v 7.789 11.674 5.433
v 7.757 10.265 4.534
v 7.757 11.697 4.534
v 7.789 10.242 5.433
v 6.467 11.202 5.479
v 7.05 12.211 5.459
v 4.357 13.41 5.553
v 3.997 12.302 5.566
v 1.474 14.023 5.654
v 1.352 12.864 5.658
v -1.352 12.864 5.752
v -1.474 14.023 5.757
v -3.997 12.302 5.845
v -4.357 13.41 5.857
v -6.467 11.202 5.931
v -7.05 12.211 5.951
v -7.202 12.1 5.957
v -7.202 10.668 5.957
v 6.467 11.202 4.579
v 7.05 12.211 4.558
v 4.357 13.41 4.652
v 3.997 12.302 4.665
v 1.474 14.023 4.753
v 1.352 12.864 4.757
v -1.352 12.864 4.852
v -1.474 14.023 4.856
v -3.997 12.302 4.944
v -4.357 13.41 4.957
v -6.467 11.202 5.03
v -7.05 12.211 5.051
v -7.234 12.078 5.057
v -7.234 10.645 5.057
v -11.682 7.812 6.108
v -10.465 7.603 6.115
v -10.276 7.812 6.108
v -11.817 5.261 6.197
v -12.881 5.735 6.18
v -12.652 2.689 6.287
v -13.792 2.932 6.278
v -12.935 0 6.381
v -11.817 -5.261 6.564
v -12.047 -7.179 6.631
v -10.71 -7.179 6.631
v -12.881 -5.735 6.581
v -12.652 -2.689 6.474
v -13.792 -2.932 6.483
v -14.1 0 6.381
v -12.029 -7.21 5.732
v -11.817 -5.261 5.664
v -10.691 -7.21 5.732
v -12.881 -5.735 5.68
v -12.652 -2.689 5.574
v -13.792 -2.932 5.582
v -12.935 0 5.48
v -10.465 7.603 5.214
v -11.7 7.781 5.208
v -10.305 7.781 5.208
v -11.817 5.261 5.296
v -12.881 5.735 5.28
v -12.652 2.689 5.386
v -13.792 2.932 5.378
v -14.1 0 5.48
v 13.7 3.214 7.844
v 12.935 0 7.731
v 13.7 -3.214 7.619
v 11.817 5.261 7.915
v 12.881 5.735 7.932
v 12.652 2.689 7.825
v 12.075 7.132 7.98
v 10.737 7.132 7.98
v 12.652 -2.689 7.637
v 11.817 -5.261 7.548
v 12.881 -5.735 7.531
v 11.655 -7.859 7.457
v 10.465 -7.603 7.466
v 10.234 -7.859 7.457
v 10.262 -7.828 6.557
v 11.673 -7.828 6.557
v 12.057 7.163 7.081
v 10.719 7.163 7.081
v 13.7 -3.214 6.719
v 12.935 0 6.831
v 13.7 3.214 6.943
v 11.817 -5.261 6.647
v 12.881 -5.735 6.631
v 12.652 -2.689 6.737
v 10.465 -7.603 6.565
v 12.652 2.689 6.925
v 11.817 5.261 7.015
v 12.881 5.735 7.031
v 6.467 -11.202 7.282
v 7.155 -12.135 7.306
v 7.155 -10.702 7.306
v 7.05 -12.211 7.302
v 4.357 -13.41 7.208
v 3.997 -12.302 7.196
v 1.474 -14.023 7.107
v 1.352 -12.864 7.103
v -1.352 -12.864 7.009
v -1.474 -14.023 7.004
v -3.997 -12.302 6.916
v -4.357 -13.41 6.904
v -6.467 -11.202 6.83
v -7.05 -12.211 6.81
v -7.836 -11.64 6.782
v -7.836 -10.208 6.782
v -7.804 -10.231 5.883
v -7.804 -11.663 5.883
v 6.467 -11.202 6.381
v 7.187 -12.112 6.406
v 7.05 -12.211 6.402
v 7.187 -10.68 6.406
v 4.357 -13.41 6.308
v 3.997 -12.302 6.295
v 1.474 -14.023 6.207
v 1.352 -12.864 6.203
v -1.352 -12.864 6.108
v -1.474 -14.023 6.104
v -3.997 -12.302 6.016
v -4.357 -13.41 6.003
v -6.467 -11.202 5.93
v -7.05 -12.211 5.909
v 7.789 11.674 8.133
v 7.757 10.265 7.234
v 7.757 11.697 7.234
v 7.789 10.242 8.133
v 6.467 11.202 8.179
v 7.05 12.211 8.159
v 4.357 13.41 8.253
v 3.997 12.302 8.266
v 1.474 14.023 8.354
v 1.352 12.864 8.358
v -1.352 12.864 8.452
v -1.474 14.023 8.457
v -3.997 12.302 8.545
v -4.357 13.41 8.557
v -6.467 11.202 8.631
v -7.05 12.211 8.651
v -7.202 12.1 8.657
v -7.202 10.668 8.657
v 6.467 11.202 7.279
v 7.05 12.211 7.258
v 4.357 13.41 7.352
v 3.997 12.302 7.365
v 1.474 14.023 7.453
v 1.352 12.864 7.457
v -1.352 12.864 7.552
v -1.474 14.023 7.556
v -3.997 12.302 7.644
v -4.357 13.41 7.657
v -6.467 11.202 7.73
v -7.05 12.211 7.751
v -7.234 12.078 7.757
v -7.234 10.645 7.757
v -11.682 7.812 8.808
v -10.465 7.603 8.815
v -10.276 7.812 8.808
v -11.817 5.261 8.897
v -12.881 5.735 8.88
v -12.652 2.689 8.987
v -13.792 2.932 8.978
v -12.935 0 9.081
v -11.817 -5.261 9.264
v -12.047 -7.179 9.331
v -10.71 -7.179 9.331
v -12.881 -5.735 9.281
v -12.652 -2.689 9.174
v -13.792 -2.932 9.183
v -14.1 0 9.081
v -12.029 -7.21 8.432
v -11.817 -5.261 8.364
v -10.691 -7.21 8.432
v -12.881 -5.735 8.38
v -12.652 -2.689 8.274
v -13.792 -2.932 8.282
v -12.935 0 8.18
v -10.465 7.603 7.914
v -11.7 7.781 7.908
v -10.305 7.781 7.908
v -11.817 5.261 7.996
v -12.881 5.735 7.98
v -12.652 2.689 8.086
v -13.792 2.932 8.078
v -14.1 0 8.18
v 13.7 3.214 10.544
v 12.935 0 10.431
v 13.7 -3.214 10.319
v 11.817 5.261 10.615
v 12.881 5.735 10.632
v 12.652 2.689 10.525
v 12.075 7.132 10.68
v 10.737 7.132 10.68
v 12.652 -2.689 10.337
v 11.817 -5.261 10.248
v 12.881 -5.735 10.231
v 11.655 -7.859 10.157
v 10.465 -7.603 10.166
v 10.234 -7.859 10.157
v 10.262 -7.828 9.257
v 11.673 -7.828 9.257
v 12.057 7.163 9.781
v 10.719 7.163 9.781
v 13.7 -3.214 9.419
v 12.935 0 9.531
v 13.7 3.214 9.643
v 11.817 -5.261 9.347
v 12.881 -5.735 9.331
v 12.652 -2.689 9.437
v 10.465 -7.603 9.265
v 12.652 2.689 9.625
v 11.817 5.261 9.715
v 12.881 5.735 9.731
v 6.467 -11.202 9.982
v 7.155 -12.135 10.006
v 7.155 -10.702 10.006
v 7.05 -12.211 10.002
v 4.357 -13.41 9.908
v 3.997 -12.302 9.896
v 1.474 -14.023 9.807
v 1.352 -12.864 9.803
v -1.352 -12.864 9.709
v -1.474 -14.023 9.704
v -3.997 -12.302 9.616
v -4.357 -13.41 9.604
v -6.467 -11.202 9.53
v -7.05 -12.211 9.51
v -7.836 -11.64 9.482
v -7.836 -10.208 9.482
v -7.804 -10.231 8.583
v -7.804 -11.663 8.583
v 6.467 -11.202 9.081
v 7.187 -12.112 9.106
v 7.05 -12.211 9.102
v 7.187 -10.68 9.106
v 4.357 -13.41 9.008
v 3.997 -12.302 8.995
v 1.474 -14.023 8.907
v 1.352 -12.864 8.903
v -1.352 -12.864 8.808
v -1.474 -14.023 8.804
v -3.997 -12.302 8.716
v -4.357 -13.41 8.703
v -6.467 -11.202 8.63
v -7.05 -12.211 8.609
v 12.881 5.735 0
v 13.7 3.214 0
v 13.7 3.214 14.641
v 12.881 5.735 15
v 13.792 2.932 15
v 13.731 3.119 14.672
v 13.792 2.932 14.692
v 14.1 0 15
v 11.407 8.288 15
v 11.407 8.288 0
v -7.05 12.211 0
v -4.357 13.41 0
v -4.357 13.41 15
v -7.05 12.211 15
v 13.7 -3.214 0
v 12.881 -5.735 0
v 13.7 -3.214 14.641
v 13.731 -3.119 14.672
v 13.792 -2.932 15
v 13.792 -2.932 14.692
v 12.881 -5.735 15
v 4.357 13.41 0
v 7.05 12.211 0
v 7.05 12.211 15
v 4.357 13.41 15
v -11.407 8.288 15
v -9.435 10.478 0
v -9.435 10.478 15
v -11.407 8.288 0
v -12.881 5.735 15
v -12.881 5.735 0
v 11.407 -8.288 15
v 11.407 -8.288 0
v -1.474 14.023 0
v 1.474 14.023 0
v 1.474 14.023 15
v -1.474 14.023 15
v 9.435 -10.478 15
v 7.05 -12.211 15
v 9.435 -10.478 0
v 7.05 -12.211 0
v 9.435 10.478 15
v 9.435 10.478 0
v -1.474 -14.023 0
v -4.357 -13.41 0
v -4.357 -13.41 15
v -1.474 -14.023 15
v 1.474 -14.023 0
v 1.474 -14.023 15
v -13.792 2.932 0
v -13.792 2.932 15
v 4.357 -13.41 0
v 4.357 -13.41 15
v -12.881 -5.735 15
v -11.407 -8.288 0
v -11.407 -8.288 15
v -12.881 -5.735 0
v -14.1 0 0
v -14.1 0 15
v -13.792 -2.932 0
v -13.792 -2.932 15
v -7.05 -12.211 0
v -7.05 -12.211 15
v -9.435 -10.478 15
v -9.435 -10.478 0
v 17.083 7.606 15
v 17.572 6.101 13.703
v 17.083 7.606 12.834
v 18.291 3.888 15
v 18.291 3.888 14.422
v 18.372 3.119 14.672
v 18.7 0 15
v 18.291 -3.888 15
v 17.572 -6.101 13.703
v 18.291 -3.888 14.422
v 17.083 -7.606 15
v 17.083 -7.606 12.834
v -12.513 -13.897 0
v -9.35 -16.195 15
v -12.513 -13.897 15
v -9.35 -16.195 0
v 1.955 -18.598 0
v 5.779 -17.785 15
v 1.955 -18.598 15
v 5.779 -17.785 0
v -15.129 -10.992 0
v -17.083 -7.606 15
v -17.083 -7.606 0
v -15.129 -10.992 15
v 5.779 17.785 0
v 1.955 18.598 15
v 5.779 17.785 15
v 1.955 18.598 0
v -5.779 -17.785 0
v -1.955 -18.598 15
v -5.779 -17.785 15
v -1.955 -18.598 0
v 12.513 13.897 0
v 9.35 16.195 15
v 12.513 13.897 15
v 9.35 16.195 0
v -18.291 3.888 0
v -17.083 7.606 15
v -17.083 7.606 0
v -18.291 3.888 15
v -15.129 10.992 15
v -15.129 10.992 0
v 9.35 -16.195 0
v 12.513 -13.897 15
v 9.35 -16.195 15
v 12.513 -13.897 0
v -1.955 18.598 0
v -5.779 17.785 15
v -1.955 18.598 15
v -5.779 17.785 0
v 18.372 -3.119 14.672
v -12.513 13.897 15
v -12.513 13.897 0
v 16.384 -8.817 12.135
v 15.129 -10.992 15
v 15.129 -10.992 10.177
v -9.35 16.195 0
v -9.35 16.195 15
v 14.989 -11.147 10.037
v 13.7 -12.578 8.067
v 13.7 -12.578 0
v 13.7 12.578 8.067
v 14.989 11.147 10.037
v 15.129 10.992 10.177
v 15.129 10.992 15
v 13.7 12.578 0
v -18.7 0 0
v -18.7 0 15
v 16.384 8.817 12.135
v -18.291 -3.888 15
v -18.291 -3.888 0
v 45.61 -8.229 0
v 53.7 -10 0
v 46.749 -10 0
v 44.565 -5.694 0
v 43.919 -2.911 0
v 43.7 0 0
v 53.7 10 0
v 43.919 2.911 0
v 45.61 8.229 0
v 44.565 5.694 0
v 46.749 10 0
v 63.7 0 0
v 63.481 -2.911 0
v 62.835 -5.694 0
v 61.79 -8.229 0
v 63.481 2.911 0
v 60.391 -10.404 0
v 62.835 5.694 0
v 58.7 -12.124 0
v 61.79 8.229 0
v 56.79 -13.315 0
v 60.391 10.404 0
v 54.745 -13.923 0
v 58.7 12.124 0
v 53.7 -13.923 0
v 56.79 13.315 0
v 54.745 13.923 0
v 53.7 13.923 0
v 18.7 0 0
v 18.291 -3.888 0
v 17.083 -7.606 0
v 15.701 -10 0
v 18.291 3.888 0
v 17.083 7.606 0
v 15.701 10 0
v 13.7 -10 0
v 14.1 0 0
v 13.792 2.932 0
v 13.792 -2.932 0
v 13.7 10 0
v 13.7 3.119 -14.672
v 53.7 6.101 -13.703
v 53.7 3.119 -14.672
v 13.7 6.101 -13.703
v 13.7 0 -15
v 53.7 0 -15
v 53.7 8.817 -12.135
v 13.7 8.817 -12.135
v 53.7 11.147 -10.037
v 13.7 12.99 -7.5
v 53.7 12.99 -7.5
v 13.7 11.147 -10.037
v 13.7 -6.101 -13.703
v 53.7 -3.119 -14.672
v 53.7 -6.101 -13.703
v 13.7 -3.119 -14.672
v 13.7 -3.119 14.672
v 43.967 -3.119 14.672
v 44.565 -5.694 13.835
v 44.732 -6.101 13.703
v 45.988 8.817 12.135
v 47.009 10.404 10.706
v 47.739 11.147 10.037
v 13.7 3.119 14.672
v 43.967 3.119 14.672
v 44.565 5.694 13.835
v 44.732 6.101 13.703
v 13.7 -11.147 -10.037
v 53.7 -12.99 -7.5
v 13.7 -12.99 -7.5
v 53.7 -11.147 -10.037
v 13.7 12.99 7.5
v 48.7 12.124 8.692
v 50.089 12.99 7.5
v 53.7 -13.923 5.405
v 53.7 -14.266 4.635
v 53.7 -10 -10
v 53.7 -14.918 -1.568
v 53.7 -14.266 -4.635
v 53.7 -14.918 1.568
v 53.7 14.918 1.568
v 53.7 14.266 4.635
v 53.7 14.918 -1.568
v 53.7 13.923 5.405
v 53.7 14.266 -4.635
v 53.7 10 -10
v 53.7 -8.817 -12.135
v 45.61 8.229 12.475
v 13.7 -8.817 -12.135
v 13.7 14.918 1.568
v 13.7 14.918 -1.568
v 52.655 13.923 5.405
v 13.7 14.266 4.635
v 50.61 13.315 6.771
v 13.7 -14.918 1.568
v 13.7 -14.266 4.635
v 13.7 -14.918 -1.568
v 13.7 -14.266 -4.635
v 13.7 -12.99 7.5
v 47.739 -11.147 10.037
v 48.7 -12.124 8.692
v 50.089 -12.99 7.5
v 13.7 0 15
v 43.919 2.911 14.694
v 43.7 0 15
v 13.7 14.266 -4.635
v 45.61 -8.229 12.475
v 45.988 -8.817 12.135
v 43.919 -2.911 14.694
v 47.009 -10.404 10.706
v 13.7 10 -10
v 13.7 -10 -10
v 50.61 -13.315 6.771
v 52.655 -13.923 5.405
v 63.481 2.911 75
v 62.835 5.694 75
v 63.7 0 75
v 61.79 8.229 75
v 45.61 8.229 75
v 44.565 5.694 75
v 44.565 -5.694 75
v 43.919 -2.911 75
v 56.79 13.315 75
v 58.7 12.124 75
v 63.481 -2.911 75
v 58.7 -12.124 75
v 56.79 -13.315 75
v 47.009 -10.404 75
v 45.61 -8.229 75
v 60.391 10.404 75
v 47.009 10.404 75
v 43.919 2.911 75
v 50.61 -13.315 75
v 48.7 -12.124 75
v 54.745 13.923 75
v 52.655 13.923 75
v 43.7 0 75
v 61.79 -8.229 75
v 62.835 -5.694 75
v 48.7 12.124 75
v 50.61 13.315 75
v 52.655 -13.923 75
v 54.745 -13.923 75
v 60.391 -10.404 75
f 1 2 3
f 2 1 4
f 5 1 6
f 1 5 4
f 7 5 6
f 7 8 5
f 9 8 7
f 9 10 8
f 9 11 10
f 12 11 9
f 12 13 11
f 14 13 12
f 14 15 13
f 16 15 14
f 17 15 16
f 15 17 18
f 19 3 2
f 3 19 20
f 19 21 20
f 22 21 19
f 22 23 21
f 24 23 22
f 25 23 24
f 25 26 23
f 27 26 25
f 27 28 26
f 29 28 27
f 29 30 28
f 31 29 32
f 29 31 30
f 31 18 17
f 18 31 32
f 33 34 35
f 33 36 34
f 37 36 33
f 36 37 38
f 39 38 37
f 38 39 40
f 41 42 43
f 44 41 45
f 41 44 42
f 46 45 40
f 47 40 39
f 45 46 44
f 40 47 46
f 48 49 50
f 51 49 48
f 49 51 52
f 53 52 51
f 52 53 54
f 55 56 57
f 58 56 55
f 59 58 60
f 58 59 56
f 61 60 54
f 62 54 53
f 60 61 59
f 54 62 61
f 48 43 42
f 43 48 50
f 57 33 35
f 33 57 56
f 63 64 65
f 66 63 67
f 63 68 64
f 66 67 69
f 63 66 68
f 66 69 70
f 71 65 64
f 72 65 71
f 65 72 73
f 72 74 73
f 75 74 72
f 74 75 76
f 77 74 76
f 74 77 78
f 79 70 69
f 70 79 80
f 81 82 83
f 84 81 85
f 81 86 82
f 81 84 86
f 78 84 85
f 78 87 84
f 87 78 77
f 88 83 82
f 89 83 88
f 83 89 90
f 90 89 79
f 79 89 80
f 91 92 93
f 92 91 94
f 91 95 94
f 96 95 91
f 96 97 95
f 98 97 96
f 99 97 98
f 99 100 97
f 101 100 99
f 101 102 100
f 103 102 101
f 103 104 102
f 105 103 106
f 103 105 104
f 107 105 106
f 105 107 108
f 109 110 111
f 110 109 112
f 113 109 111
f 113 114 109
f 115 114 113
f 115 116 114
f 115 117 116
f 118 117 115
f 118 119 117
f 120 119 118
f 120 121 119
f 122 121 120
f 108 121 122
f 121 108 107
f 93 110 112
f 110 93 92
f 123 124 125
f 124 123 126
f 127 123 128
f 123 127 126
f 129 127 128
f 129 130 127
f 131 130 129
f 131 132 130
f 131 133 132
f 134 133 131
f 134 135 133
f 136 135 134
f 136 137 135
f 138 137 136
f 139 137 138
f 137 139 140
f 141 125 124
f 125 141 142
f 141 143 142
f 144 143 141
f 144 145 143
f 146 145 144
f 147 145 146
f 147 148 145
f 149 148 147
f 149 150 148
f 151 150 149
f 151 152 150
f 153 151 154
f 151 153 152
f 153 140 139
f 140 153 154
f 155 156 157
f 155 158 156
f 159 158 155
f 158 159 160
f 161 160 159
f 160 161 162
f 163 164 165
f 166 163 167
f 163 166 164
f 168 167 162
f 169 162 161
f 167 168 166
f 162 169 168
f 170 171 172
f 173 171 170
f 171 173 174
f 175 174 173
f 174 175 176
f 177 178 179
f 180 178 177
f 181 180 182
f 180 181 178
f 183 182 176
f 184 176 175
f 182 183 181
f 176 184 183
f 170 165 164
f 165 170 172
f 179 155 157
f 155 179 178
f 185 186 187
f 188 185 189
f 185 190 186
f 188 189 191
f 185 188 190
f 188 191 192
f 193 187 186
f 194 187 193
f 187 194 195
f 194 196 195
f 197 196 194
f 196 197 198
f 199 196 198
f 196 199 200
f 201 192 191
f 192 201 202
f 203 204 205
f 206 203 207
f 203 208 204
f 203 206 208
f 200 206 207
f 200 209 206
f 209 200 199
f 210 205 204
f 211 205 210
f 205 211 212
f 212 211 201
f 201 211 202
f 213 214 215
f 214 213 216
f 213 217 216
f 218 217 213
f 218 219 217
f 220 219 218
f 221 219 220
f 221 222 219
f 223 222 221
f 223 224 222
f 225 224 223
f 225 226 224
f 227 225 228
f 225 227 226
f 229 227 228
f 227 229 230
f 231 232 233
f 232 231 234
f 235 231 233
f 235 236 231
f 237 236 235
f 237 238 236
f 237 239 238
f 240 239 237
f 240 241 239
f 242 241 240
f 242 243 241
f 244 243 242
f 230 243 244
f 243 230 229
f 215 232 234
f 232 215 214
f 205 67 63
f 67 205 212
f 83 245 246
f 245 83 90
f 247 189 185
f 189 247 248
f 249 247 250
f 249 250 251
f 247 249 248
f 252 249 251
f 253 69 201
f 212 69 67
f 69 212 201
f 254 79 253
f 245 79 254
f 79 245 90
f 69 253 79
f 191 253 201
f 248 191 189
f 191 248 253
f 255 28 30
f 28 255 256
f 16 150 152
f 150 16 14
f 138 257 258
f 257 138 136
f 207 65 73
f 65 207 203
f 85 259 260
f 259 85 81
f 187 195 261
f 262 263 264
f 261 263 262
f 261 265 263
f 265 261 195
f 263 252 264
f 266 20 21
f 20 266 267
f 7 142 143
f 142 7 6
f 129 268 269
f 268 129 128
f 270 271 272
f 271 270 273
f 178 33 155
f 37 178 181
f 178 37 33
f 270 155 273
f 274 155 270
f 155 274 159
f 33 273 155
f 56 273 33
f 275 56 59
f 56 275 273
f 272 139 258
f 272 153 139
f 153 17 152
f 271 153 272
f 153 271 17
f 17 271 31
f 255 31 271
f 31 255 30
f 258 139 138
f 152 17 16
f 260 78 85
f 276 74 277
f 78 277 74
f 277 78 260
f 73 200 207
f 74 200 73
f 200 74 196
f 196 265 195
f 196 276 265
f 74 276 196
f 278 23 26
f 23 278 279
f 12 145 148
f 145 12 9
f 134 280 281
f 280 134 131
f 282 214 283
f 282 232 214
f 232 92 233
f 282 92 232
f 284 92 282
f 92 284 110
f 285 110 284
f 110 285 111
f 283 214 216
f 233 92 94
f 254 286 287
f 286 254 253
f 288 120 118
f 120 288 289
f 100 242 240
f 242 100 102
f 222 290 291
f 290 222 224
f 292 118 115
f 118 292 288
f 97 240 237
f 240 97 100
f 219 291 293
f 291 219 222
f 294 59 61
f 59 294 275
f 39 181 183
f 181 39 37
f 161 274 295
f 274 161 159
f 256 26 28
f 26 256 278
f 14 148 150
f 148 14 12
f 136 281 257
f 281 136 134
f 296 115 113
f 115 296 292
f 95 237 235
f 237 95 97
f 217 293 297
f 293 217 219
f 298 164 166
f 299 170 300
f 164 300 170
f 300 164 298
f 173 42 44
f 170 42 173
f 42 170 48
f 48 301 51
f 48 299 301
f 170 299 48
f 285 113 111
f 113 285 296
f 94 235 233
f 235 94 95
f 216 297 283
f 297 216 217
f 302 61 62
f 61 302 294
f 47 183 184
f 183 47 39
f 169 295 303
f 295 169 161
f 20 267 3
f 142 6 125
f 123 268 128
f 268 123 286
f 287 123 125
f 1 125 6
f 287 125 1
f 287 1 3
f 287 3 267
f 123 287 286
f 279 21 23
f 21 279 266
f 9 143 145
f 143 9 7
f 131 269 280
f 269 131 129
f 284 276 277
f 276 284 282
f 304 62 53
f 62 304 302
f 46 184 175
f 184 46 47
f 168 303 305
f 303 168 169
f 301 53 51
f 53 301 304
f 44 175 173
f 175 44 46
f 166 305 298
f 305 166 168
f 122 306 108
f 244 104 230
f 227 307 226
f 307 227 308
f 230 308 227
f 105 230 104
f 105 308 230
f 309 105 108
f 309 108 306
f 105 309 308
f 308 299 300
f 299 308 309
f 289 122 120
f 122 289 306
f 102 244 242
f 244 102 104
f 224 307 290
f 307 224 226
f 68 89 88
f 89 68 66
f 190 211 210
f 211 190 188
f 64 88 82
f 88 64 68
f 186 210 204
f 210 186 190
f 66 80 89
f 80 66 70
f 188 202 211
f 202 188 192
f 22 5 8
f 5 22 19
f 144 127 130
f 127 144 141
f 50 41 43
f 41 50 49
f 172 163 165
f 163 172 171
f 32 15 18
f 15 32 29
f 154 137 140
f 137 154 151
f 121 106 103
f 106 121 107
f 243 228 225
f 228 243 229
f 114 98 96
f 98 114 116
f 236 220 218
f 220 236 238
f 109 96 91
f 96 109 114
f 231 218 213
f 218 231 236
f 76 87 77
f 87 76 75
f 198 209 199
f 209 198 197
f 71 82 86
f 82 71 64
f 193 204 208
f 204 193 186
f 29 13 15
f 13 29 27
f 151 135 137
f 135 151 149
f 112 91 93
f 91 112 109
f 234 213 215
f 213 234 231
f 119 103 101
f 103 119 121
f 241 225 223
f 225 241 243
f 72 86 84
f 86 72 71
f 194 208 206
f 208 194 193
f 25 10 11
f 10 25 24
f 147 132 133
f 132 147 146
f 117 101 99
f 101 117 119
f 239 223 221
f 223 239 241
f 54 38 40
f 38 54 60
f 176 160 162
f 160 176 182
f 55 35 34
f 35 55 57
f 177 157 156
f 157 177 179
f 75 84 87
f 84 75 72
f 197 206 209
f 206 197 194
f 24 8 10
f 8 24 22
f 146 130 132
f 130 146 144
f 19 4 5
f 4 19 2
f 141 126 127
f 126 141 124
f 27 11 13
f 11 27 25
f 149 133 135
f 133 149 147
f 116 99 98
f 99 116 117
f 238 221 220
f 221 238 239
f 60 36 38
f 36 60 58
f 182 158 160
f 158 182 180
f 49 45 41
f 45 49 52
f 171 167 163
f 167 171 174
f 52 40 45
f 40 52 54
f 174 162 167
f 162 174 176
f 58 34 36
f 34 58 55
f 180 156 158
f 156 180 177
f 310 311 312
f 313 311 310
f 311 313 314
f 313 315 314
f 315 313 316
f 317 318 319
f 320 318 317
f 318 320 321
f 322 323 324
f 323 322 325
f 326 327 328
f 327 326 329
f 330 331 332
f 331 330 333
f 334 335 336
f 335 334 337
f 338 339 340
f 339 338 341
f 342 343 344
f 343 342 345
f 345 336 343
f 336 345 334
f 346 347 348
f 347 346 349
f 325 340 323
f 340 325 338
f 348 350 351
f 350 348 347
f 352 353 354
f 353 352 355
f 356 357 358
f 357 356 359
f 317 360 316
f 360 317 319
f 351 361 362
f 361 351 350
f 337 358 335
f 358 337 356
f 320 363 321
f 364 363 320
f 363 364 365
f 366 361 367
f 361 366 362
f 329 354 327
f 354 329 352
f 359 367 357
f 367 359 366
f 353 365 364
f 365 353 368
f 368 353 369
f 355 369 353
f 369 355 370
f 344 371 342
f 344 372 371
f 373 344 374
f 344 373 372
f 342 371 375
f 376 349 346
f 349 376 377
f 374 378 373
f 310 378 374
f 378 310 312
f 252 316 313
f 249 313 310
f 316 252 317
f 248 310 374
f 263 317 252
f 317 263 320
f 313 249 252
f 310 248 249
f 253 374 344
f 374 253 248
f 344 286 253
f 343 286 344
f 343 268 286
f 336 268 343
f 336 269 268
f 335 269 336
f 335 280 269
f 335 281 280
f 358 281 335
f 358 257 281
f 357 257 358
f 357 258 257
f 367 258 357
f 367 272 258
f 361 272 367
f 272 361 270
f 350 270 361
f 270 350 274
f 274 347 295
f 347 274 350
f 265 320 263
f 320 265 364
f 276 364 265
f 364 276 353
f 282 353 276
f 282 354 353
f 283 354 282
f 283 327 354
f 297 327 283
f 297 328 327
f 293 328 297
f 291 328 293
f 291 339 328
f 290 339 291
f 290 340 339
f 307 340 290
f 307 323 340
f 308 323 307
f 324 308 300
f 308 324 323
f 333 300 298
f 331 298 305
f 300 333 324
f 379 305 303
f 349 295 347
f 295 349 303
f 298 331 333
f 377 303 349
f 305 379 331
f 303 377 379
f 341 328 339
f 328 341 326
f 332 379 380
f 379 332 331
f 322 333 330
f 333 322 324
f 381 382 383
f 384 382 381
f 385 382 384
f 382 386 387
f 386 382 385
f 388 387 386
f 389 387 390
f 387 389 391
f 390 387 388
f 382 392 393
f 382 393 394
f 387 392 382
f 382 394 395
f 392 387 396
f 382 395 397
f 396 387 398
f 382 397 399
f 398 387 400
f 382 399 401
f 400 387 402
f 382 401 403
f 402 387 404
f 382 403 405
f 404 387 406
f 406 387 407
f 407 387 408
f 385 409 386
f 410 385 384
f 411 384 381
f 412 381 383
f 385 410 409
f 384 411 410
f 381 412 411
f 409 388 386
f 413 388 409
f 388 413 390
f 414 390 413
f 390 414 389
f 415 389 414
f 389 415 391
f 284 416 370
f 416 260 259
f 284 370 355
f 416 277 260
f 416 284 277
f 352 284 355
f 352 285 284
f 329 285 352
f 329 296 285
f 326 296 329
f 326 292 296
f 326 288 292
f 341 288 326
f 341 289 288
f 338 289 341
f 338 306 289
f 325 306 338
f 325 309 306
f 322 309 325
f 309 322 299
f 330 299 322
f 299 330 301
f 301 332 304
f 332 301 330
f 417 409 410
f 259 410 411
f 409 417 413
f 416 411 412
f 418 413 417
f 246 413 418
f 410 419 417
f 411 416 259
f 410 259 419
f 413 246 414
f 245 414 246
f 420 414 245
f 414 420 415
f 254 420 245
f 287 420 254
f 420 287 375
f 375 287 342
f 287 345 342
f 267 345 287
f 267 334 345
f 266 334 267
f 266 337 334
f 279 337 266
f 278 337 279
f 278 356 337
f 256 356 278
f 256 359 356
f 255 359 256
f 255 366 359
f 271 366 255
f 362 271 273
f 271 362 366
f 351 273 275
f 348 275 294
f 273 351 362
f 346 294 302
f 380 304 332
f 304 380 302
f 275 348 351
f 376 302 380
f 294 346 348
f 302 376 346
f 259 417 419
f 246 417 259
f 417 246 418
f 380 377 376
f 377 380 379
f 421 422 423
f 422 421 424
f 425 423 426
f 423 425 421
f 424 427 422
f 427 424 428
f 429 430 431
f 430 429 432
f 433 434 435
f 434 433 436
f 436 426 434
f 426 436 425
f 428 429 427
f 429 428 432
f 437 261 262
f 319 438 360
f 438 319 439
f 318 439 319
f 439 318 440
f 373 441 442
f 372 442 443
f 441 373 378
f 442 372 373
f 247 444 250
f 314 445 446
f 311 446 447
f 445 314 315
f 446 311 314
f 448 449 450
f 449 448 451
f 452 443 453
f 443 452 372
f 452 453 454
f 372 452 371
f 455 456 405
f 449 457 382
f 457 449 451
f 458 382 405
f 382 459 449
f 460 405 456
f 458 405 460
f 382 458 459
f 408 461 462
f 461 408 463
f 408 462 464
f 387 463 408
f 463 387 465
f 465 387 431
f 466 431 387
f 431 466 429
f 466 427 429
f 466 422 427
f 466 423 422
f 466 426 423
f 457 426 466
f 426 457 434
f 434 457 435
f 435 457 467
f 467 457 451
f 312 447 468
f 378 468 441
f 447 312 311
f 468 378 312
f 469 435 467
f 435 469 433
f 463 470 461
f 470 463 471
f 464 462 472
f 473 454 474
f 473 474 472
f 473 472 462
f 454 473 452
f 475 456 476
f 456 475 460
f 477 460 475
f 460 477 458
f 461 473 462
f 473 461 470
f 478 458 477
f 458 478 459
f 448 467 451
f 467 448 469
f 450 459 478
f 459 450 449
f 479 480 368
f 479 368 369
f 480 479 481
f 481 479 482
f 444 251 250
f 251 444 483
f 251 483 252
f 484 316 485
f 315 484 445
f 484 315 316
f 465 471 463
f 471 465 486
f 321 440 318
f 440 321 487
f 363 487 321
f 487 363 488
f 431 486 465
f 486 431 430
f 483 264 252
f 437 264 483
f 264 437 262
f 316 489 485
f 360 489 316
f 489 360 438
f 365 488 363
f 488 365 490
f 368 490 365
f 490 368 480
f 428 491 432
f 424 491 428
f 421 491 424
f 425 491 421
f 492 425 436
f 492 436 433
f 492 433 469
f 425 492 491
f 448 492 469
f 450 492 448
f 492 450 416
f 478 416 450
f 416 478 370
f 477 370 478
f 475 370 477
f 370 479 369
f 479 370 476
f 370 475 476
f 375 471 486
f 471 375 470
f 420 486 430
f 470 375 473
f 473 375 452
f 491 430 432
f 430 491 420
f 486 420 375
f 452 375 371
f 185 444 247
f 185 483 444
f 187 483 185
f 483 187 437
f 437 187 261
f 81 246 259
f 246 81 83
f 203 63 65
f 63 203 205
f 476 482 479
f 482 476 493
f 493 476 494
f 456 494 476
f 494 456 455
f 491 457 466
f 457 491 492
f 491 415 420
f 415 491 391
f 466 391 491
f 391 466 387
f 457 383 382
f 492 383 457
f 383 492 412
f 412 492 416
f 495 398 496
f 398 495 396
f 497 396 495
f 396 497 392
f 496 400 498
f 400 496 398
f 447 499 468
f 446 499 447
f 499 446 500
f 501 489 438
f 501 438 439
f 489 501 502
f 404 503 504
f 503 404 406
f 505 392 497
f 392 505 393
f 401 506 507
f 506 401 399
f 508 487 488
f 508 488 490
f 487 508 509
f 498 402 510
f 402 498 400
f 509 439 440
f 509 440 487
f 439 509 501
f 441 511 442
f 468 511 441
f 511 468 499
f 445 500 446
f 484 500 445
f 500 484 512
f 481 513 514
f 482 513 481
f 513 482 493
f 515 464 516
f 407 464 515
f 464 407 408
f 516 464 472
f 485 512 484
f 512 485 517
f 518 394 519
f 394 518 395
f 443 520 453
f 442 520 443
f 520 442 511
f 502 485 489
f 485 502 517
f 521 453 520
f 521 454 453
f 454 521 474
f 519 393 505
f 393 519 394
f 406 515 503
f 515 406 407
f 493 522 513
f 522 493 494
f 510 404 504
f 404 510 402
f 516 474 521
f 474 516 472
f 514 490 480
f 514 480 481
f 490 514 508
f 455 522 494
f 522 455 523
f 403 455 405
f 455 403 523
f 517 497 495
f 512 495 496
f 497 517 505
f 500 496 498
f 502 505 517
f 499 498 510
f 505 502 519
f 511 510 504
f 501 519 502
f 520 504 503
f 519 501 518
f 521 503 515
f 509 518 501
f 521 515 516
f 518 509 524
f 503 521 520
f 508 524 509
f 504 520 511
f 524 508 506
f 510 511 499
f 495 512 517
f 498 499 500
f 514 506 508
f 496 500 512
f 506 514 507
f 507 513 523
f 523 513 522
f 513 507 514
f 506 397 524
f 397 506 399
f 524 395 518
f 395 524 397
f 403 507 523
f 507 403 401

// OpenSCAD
// 2 Liter Bottle Holder
//
// (c) 2013 Laird Popkin, based on http://www.threadspecs.com/assets/Threadspecs/ISBT-PCO-1881-Finish-3784253-18.pdf.
// Credit to eagleapex for creating and then deleting http://www.thingiverse.com/thing:10489 
// which inspired me to create this.
//
// Respun to do http://www.thingiverse.com/thing:310961 parametrically.
//
// TO DO:
// - Add narrow and wide mason jar measurements as selectable jars
// - Add a label imprinted around the rim (your name, etc.)

/* [Hidden] */

part="mug"; // "threads" for the part to print, "neck" for the part to subtract from your part
clearance=0.4; // tune to get the right 'fit' for your printer
jar = [[0,0,0,0],
	[25.07, 27.4, 2.7, 2, 15, 9]
	]; // 2 liter bottle

// http://en.wikipedia.org/wiki/Mason_jar

// regular mouth 2 3⁄8 in (60 mm) inner [2 3⁄4 in (70 mm) outer] diameter or 
// wide mouth 3 in (76 mm) inner [3 3⁄8 in (86 mm) outer] diameter

//standard narrow mouth canning jar:
//
//standard narrow mouth canning jar. It is 5tpi.
//The height of the 5 tpi thread is 0.060". The radius of the thread top is 0.044". The radius of the 
//base corner roots is 0.030" max. The sides of the threads are thirty degrees from vertical."

/* [Jar Measurements] */

// Pick jar size

jarNumber = 1; // [1:2 Liter bottle, 0:Custom]
// Custom inner diameter (not including threads)
jarID = 25.07;
bottleID = jarNumber ? jar[jarNumber][0] : jarID;
echo(bottleID);
// Custom outer diameter (including threads)
jarOD=27.4;
bottleOD=jarNumber ? jar[jarNumber][1] : jarOD;
// Custom thread vertical spacing (mm)
jarPitch=2.7;
bottlePitch=jarNumber ? jar[jarNumber][2] : jarPitch;
// Custom angle of thread screws (degrees, 0 = level)
jarAngle=2;
bottleAngle=jarNumber ? jar[jarNumber][3] : jarAngle;
// Length of thread (mm)
jarThreadLen=15;
threadLen=jarThreadLen;
// Height of rim around jar (mm) neasured from beat to top of mouth
threadHeight=9;
bottleHeight=jarNumber ? jar[jarNumber][4] : threadHeight;

/* [Holder] */

// Thickness of rim (mm)
rim = 5;
// Handle Length
handleLength = 75;
// Handle Thickness
handleThick = 20;
// Hand Space (between jar and handle)
handSpace = 25;

// holder params

holderOD=bottleOD+rim;
holderOR=holderOD/2;

// funnel params

funnelOD=100;
funnelWall=2;

// Bottle Computations

threadHeight = bottlePitch/3;
echo("thread height ",threadHeight);
echo("thread depth ",(bottleOD-bottleID)/2);

module bottleNeck() {
	difference() {
		union() {
			translate([0,0,-0.5]) cylinder(r=bottleOD/2+clearance,h=bottleHeight+1);
			}
		union() {
			rotate([0,bottleAngle,0]) translate([-threadLen/2,0,bottleHeight/2]) cube([threadLen,bottleOD,threadHeight]);
			rotate([0,bottleAngle,90]) translate([-threadLen/2,0,bottleHeight/2+bottlePitch/4]) cube([threadLen,bottleOD,threadHeight]);
			rotate([0,bottleAngle,-90]) translate([-threadLen/2,0,bottleHeight/2+bottlePitch*3/4]) cube([threadLen,bottleOD,threadHeight]);
			rotate([0,bottleAngle,180]) translate([-threadLen/2,0,bottleHeight/2+bottlePitch/2]) cube([threadLen,bottleOD,threadHeight]);
			translate([0,0,-bottlePitch]) {
				rotate([0,bottleAngle,0]) translate([-threadLen/2,0,bottleHeight/2]) cube([threadLen,bottleOD,threadHeight]);
				rotate([0,bottleAngle,90]) translate([-threadLen/2,0,bottleHeight/2+bottlePitch/4]) cube([threadLen,bottleOD,threadHeight]);
				rotate([0,bottleAngle,-90]) translate([-threadLen/2,0,bottleHeight/2+bottlePitch*3/4]) cube([threadLen,bottleOD,threadHeight]);
				rotate([0,bottleAngle,180]) translate([-threadLen/2,0,bottleHeight/2+bottlePitch/2]) cube([threadLen,bottleOD,threadHeight]);
				}
			//translate([0,0,bottleHeight/2+bottlePitch/2]) rotate([0,0,90]) cube([10,bottleOD,threadHeight], center=true);
			}
		}
	translate([0,0,-1]) cylinder(r=bottleID/2+clearance,h=bottleHeight+2);
	}

module bottleHolder() {
	difference() {
		cylinder(r=bottleOD/2+rim,h=bottleHeight);
		bottleNeck();
		}
	}

module bottleCap() {
	translate([0,0,1]) bottleHolder();
	cylinder(r=holderOR, h=1);
	}

module bottleMug() {
	bottleHolder();
	echo(bottleOD/2+rim+handSpace+handleThick);
	translate([bottleOD/2+rim+handSpace+handleThick/2,0,0]) scale([1,1.4,1]) cylinder(r=handleThick/2,h=handleLength);
	translate([bottleOD/2,0,0]) rotate([0,90,0]) difference() {
		cylinder(h=handSpace+rim+handleThick/2, r=bottleHeight);
		translate([0,-handleThick/2,0]) cube([handleThick/2,handleThick,handleLength]);
		}
	}

module funnel() {
	translate([0,0,bottleHeight]) difference() {
		difference() {
			cylinder(r=holderOR, h=funnelWall);
			translate([0,0,-.1]) cylinder(r=bottleID/2, h=funnelWall+.2);
			}
		}
	translate([0,0,bottleHeight+funnelWall]) difference() {
		cylinder(r1=holderOR,r2=funnelOD, h=funnelOD-bottleOD);
		translate([0,0,-.1]) cylinder(r1=bottleID/2,r2=funnelOD-funnelWall, h=funnelOD-bottleOD+.2);
		}
	bottleHolder();
	}

if (part=="threads") bottleHolder();;
if (part=="neck") bottleNeck();
if (part=="funnel") funnel();
if (part=="holder") bottleHolder();
if (part=="cap") bottleCap();
if (part=="mug") bottleMug();
